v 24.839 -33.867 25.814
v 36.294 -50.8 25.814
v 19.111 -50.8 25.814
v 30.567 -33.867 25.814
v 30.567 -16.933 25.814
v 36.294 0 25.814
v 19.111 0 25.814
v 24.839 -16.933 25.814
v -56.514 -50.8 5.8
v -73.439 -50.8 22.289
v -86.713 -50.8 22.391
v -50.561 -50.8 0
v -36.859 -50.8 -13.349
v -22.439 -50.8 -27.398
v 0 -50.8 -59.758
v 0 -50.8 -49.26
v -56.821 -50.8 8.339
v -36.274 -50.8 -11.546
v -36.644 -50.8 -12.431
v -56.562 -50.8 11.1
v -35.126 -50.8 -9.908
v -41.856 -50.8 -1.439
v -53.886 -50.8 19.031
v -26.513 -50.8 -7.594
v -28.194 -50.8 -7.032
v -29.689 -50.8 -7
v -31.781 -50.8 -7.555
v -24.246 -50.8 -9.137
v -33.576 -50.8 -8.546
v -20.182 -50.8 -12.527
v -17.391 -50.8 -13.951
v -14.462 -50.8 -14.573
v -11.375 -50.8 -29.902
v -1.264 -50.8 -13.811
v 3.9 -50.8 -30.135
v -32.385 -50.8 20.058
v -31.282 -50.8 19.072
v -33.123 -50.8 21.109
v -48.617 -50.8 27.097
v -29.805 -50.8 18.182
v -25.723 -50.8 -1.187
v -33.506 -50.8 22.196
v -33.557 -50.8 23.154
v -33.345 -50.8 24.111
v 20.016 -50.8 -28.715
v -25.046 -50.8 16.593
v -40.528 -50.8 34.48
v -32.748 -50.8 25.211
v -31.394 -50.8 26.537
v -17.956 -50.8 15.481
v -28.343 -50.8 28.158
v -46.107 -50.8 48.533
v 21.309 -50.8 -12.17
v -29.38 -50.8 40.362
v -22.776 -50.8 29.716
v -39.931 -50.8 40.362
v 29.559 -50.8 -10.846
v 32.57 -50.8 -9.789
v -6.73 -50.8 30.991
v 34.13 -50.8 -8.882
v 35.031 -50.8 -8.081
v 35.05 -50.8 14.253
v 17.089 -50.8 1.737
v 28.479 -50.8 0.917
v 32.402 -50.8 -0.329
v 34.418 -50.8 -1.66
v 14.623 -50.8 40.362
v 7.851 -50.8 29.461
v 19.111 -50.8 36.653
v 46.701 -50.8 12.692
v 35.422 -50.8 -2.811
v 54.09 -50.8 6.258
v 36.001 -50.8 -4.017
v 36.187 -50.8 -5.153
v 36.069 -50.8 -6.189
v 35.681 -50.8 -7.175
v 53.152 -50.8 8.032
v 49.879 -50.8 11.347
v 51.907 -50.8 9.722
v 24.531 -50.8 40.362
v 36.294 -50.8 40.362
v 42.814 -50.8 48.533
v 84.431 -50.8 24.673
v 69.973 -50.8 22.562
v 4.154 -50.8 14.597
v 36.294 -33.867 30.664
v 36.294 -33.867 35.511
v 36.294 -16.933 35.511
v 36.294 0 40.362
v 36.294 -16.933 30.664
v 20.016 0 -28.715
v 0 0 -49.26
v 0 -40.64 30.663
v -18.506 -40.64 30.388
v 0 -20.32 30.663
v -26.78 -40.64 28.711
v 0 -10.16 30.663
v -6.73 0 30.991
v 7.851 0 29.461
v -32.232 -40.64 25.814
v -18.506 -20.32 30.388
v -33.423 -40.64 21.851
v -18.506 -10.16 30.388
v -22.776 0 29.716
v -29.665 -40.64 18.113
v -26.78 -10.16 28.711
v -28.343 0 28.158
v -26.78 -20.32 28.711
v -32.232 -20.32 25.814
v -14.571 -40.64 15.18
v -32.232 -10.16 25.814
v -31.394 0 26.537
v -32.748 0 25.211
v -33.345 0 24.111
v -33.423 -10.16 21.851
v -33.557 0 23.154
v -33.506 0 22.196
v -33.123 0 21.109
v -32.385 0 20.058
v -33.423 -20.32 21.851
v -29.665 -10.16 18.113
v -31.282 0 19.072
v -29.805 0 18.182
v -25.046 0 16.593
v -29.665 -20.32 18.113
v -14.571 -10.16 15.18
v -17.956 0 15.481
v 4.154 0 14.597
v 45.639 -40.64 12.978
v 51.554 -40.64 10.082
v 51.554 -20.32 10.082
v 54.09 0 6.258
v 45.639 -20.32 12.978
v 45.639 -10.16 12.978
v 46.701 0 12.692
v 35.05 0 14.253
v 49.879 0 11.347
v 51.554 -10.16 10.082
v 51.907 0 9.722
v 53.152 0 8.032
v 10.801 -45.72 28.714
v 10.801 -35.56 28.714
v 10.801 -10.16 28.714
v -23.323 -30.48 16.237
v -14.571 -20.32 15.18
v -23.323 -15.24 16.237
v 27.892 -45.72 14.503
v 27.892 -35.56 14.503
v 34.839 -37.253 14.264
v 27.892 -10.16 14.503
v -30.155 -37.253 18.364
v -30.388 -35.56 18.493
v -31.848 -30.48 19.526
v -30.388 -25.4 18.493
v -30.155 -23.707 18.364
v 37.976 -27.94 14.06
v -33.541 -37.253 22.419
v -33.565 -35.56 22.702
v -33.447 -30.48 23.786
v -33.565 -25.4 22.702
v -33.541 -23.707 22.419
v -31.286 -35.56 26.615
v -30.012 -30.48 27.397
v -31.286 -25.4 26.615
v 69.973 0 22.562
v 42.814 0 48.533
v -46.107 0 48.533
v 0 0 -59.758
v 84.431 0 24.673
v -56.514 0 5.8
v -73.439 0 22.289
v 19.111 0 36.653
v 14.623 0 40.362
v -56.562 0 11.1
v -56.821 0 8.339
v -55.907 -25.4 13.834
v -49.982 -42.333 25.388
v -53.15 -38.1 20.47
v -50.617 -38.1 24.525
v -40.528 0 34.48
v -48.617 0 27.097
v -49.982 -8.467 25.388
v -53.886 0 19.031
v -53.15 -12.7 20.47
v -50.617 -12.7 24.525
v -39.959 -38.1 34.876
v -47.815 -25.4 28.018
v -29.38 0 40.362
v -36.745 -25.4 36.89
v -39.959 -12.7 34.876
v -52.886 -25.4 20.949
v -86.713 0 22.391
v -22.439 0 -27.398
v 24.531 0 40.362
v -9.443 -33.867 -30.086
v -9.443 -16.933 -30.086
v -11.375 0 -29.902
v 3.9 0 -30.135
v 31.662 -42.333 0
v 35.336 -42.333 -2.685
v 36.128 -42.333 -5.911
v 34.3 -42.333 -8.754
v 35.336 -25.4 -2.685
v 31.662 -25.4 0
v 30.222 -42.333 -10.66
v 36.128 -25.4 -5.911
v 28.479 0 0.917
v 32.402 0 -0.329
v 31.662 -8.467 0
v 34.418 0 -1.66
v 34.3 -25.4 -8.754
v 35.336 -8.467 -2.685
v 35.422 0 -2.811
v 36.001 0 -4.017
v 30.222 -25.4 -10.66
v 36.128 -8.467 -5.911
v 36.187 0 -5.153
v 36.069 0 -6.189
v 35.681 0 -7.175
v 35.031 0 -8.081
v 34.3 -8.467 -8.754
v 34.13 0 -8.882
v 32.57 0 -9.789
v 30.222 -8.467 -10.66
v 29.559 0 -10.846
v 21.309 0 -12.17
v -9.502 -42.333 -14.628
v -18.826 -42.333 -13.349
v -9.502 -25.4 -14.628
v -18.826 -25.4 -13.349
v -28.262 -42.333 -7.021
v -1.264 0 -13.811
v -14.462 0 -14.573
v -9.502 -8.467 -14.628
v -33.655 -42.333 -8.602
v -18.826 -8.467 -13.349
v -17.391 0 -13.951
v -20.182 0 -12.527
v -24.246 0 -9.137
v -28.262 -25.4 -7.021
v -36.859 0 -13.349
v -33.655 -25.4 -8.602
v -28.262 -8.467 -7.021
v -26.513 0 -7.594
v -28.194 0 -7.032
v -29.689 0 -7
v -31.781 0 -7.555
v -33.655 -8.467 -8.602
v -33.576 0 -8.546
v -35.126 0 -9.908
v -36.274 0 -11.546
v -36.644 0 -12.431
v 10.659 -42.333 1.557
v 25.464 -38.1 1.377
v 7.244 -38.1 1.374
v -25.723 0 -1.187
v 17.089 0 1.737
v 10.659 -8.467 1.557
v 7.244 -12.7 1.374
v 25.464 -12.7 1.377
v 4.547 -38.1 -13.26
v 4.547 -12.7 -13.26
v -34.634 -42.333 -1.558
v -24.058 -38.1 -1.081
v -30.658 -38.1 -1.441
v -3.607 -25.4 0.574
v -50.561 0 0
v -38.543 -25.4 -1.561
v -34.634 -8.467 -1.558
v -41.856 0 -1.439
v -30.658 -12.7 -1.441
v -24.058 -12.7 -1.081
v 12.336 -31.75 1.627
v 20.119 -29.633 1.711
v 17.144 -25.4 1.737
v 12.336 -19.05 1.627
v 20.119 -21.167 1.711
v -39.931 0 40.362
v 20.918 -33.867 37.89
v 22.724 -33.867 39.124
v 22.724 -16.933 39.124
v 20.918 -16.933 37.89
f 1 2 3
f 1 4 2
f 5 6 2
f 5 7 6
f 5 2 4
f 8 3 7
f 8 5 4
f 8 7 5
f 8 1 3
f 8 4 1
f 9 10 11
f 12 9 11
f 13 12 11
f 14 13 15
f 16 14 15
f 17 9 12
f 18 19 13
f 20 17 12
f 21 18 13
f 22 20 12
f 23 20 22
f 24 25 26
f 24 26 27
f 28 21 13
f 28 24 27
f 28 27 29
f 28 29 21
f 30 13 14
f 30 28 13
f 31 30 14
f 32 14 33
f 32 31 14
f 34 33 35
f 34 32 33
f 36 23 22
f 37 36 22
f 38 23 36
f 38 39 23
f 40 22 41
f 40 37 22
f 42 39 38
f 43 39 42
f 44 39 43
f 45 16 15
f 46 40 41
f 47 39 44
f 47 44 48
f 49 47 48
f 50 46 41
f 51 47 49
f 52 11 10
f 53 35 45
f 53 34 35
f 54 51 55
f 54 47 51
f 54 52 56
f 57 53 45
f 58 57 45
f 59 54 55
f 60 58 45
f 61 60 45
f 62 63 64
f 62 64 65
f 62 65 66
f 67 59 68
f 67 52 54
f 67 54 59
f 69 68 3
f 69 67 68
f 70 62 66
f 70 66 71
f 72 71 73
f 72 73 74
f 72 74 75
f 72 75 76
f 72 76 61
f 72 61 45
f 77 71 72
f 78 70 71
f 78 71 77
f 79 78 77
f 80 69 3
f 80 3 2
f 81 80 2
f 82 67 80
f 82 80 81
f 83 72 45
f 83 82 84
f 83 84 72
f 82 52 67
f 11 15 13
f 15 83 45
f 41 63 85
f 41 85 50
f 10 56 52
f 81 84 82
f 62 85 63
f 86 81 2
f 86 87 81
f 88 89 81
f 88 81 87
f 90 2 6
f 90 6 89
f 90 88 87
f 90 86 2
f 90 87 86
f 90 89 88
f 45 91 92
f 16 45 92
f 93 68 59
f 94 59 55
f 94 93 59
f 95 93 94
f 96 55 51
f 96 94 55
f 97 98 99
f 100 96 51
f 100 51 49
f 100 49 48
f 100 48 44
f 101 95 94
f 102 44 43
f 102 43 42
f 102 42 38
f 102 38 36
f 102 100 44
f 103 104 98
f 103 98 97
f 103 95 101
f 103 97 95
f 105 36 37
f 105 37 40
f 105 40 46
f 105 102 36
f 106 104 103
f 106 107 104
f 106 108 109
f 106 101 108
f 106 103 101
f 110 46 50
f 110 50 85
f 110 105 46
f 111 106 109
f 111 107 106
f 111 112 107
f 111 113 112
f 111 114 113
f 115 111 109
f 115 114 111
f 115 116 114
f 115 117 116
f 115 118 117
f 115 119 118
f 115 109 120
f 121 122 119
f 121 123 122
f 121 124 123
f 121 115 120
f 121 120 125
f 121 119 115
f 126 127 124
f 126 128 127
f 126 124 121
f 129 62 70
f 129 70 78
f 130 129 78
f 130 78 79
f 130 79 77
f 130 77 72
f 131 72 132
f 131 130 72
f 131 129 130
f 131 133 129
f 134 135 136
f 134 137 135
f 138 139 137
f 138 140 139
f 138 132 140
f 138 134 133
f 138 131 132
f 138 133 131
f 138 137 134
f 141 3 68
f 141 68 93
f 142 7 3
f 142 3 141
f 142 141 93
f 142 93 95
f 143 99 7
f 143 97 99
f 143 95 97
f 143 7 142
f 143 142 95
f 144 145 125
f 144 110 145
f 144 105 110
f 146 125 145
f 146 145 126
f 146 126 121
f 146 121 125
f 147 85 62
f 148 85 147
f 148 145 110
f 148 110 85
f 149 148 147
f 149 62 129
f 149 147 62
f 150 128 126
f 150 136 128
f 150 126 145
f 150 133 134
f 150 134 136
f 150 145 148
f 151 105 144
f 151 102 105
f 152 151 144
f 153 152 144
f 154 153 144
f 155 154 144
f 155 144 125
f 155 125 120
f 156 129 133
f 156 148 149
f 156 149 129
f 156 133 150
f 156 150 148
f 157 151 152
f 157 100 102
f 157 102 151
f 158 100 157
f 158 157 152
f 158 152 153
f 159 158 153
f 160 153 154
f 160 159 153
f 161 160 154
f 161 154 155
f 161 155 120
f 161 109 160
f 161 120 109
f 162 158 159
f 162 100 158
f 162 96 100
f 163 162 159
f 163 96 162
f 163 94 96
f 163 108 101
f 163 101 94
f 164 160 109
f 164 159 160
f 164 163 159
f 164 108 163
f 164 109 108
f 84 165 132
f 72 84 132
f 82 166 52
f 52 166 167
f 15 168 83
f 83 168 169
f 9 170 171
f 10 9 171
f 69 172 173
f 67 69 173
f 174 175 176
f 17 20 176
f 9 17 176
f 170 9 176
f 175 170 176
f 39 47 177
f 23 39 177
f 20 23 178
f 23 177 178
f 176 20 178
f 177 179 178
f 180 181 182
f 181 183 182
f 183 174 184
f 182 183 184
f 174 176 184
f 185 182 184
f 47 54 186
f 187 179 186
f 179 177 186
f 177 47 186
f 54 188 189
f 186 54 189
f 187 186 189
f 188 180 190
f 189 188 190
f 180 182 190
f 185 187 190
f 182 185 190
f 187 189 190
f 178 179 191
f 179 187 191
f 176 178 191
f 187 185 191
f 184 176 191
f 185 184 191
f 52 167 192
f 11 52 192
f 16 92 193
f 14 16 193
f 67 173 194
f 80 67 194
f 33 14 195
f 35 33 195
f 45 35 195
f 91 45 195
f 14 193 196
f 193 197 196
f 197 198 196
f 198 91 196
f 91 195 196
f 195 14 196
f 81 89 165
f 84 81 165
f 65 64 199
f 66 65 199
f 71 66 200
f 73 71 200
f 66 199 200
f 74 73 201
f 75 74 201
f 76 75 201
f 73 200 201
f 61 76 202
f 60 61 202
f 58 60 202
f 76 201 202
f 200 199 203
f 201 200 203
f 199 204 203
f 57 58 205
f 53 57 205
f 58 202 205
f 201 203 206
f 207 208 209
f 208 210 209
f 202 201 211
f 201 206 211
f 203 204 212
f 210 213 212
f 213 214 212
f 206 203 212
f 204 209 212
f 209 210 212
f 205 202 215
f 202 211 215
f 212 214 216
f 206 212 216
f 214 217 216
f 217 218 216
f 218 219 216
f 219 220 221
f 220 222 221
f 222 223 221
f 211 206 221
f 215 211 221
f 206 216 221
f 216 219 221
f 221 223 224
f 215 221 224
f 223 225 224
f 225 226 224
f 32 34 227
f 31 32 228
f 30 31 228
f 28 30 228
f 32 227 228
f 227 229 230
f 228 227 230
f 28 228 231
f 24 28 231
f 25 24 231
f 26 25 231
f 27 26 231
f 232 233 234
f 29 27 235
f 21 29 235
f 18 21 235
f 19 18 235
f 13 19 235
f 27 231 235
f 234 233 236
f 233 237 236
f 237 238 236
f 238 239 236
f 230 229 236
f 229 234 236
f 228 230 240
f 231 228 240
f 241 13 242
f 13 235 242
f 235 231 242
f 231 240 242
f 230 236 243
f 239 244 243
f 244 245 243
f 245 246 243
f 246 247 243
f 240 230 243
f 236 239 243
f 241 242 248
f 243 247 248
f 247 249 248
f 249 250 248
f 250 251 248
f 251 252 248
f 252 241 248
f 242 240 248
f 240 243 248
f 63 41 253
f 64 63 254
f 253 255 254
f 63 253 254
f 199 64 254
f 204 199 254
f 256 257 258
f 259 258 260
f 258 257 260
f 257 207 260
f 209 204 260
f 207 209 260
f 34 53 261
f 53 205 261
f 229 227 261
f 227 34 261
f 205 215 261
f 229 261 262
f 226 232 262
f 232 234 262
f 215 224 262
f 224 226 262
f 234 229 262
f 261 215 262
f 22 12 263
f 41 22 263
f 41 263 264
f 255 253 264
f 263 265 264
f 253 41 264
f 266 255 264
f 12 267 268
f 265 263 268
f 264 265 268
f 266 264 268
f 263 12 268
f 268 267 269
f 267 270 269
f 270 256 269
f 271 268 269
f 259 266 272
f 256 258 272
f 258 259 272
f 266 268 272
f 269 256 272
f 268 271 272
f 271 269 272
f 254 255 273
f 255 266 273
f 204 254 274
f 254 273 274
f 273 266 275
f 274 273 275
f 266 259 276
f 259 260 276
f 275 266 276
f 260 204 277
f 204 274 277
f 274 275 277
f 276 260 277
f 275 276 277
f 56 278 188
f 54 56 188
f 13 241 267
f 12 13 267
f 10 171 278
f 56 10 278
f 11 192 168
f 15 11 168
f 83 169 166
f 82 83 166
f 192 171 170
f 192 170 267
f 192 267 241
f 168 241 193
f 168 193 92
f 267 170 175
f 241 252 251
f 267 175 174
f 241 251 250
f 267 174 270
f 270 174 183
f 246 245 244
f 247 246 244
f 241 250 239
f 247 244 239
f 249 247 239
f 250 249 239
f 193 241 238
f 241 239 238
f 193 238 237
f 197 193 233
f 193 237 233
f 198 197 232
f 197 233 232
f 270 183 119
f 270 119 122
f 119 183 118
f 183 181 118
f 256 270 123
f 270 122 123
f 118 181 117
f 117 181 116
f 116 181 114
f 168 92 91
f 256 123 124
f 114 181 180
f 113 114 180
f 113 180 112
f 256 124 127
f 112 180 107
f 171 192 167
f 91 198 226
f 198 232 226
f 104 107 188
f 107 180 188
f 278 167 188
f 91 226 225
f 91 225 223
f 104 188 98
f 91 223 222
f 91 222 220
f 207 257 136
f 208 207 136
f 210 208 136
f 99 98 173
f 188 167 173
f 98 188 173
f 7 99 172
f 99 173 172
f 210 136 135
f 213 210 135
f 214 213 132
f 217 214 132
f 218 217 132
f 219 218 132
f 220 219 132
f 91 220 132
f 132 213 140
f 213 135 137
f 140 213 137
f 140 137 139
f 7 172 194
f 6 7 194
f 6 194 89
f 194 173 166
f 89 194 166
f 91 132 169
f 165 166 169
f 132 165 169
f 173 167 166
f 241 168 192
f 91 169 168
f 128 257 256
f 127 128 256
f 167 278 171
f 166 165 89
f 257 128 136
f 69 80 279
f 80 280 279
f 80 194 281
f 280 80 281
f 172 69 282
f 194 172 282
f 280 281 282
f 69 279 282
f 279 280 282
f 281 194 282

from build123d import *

# Parameters (mm, degrees)
F1_DEPTH = 50.8


with BuildPart() as f1:
    # F0 (on Front) → F1 (new body)
    with BuildSketch(Plane.XZ):
        Polygon((42.8139790893, 48.5327467322), (-46.1068861187, 48.5327467322), (-86.7131575942, 22.3913900554), (0, -59.7579181194), (84.4312310219, 24.6733147651), align=None)
        with BuildLine():
            Line((0, -49.2601079148), (-22.4392601443, -27.3983288212))
            add(Edge.make_bspline(
                [(-22.4392601443, -27.3983288212), (-10.3736160037, -31.8857986211), (4.8388807016, -30.2985507846), (20.0164040618, -28.7149685657)],
                knots=[0.8697267314, 0.8697267314, 0.8697267314, 0.8697267314, 1, 1, 1, 1], degree=3))
            Line((20.0164040618, -28.7149685657), (0, -49.2601079148))
        make_face(mode=Mode.SUBTRACT)
        with BuildLine():
            Line((-36.8594226393, -13.3492735078), (-50.5613185232, 0))
            add(Edge.make_bspline(
                [(-50.5613185232, 0), (-34.594195391, -5.5755217109), (33.9571013413, 9.6518252733), (38.7814875684, -12.9370721173), (2.361993239, -12.0508571536), (-19.0652817801, -17.2148074093), (-27.2819615194, -3.4022296448), (-36.3530555491, -9.74744955), (-36.8594226393, -13.3492735078)],
                knots=[0.1994086275, 0.1994086275, 0.1994086275, 0.1994086275, 0.3806593926, 0.439898091, 0.552957602, 0.6472411988, 0.7153144049, 0.7800392485, 0.7800392485, 0.7800392485, 0.7800392485], degree=3))
        make_face(mode=Mode.SUBTRACT)
        with BuildLine():
            Line((-73.4394822067, 22.2893873193), (-39.9312501347, 40.3615534306))
            Line((-39.9312501347, 40.3615534306), (-29.3797869235, 40.3615534306))
            add(Edge.make_bspline(
                [(-29.3797869235, 40.3615534306), (-44.8898971081, 34.454703331), (-55.5649465868, 20.0618318815), (-57.1293154368, 8.1559515897), (-56.5142302299, 5.7997117488)],
                knots=[0, 0, 0, 0, 0.1224299889, 0.159580752, 0.159580752, 0.159580752, 0.159580752], degree=3))
            Line((-56.5142302299, 5.7997117488), (-73.4394822067, 22.2893873193))
        make_face(mode=Mode.SUBTRACT)
        with BuildLine():
            add(Edge.make_bspline(
                [(36.2942307097, 40.3615534306), (36.2942307097, 35.5078813536), (36.2942307097, 30.6679519908), (36.2942307097, 25.8142799139)],
                knots=[0, 0, 0, 0, 14.5472735167, 14.5472735167, 14.5472735167, 14.5472735167], degree=3))
            Line((36.2942307097, 40.3615534306), (69.9733167514, 22.5615608992))
            Line((69.9733167514, 22.5615608992), (54.0895060836, 6.2581778062))
            add(Edge.make_bspline(
                [(19.111122936, 25.8142799139), (13.8479000757, 27.8529717323), (1.8174713939, 32.5129181522), (-35.8152425943, 30.003164995), (-32.0254529515, 10.2051564982), (47.9834132494, 18.5761521201), (52.7746580758, 8.9106536899), (54.0895060836, 6.2581778062)],
                knots=[0, 0, 0, 0, 0.1778094364, 0.4064284945, 0.5205229582, 0.8684184474, 1, 1, 1, 1], degree=3))
            add(Edge.make_bspline(
                [(36.2942307097, 25.8142799139), (30.5665281185, 25.8142799139), (24.8388255272, 25.8142799139), (19.111122936, 25.8142799139)],
                knots=[0, 0, 0, 0, 17.1831077737, 17.1831077737, 17.1831077737, 17.1831077737], degree=3))
        make_face(mode=Mode.SUBTRACT)
        with BuildLine():
            Line((14.6225690842, 40.3615534306), (24.5306938887, 40.3615534306))
            add(Edge.make_bspline(
                [(24.5306938887, 40.3615534306), (22.7241702378, 39.1209286554), (20.9176465869, 37.8940465944), (19.111122936, 36.6534218192)],
                knots=[0, 0, 0, 0, 6.5667335379, 6.5667335379, 6.5667335379, 6.5667335379], degree=3))
            Line((19.111122936, 36.6534218192), (14.6225690842, 40.3615534306))
        make_face(mode=Mode.SUBTRACT)
    extrude(amount=F1_DEPTH)


solid = f1.part
